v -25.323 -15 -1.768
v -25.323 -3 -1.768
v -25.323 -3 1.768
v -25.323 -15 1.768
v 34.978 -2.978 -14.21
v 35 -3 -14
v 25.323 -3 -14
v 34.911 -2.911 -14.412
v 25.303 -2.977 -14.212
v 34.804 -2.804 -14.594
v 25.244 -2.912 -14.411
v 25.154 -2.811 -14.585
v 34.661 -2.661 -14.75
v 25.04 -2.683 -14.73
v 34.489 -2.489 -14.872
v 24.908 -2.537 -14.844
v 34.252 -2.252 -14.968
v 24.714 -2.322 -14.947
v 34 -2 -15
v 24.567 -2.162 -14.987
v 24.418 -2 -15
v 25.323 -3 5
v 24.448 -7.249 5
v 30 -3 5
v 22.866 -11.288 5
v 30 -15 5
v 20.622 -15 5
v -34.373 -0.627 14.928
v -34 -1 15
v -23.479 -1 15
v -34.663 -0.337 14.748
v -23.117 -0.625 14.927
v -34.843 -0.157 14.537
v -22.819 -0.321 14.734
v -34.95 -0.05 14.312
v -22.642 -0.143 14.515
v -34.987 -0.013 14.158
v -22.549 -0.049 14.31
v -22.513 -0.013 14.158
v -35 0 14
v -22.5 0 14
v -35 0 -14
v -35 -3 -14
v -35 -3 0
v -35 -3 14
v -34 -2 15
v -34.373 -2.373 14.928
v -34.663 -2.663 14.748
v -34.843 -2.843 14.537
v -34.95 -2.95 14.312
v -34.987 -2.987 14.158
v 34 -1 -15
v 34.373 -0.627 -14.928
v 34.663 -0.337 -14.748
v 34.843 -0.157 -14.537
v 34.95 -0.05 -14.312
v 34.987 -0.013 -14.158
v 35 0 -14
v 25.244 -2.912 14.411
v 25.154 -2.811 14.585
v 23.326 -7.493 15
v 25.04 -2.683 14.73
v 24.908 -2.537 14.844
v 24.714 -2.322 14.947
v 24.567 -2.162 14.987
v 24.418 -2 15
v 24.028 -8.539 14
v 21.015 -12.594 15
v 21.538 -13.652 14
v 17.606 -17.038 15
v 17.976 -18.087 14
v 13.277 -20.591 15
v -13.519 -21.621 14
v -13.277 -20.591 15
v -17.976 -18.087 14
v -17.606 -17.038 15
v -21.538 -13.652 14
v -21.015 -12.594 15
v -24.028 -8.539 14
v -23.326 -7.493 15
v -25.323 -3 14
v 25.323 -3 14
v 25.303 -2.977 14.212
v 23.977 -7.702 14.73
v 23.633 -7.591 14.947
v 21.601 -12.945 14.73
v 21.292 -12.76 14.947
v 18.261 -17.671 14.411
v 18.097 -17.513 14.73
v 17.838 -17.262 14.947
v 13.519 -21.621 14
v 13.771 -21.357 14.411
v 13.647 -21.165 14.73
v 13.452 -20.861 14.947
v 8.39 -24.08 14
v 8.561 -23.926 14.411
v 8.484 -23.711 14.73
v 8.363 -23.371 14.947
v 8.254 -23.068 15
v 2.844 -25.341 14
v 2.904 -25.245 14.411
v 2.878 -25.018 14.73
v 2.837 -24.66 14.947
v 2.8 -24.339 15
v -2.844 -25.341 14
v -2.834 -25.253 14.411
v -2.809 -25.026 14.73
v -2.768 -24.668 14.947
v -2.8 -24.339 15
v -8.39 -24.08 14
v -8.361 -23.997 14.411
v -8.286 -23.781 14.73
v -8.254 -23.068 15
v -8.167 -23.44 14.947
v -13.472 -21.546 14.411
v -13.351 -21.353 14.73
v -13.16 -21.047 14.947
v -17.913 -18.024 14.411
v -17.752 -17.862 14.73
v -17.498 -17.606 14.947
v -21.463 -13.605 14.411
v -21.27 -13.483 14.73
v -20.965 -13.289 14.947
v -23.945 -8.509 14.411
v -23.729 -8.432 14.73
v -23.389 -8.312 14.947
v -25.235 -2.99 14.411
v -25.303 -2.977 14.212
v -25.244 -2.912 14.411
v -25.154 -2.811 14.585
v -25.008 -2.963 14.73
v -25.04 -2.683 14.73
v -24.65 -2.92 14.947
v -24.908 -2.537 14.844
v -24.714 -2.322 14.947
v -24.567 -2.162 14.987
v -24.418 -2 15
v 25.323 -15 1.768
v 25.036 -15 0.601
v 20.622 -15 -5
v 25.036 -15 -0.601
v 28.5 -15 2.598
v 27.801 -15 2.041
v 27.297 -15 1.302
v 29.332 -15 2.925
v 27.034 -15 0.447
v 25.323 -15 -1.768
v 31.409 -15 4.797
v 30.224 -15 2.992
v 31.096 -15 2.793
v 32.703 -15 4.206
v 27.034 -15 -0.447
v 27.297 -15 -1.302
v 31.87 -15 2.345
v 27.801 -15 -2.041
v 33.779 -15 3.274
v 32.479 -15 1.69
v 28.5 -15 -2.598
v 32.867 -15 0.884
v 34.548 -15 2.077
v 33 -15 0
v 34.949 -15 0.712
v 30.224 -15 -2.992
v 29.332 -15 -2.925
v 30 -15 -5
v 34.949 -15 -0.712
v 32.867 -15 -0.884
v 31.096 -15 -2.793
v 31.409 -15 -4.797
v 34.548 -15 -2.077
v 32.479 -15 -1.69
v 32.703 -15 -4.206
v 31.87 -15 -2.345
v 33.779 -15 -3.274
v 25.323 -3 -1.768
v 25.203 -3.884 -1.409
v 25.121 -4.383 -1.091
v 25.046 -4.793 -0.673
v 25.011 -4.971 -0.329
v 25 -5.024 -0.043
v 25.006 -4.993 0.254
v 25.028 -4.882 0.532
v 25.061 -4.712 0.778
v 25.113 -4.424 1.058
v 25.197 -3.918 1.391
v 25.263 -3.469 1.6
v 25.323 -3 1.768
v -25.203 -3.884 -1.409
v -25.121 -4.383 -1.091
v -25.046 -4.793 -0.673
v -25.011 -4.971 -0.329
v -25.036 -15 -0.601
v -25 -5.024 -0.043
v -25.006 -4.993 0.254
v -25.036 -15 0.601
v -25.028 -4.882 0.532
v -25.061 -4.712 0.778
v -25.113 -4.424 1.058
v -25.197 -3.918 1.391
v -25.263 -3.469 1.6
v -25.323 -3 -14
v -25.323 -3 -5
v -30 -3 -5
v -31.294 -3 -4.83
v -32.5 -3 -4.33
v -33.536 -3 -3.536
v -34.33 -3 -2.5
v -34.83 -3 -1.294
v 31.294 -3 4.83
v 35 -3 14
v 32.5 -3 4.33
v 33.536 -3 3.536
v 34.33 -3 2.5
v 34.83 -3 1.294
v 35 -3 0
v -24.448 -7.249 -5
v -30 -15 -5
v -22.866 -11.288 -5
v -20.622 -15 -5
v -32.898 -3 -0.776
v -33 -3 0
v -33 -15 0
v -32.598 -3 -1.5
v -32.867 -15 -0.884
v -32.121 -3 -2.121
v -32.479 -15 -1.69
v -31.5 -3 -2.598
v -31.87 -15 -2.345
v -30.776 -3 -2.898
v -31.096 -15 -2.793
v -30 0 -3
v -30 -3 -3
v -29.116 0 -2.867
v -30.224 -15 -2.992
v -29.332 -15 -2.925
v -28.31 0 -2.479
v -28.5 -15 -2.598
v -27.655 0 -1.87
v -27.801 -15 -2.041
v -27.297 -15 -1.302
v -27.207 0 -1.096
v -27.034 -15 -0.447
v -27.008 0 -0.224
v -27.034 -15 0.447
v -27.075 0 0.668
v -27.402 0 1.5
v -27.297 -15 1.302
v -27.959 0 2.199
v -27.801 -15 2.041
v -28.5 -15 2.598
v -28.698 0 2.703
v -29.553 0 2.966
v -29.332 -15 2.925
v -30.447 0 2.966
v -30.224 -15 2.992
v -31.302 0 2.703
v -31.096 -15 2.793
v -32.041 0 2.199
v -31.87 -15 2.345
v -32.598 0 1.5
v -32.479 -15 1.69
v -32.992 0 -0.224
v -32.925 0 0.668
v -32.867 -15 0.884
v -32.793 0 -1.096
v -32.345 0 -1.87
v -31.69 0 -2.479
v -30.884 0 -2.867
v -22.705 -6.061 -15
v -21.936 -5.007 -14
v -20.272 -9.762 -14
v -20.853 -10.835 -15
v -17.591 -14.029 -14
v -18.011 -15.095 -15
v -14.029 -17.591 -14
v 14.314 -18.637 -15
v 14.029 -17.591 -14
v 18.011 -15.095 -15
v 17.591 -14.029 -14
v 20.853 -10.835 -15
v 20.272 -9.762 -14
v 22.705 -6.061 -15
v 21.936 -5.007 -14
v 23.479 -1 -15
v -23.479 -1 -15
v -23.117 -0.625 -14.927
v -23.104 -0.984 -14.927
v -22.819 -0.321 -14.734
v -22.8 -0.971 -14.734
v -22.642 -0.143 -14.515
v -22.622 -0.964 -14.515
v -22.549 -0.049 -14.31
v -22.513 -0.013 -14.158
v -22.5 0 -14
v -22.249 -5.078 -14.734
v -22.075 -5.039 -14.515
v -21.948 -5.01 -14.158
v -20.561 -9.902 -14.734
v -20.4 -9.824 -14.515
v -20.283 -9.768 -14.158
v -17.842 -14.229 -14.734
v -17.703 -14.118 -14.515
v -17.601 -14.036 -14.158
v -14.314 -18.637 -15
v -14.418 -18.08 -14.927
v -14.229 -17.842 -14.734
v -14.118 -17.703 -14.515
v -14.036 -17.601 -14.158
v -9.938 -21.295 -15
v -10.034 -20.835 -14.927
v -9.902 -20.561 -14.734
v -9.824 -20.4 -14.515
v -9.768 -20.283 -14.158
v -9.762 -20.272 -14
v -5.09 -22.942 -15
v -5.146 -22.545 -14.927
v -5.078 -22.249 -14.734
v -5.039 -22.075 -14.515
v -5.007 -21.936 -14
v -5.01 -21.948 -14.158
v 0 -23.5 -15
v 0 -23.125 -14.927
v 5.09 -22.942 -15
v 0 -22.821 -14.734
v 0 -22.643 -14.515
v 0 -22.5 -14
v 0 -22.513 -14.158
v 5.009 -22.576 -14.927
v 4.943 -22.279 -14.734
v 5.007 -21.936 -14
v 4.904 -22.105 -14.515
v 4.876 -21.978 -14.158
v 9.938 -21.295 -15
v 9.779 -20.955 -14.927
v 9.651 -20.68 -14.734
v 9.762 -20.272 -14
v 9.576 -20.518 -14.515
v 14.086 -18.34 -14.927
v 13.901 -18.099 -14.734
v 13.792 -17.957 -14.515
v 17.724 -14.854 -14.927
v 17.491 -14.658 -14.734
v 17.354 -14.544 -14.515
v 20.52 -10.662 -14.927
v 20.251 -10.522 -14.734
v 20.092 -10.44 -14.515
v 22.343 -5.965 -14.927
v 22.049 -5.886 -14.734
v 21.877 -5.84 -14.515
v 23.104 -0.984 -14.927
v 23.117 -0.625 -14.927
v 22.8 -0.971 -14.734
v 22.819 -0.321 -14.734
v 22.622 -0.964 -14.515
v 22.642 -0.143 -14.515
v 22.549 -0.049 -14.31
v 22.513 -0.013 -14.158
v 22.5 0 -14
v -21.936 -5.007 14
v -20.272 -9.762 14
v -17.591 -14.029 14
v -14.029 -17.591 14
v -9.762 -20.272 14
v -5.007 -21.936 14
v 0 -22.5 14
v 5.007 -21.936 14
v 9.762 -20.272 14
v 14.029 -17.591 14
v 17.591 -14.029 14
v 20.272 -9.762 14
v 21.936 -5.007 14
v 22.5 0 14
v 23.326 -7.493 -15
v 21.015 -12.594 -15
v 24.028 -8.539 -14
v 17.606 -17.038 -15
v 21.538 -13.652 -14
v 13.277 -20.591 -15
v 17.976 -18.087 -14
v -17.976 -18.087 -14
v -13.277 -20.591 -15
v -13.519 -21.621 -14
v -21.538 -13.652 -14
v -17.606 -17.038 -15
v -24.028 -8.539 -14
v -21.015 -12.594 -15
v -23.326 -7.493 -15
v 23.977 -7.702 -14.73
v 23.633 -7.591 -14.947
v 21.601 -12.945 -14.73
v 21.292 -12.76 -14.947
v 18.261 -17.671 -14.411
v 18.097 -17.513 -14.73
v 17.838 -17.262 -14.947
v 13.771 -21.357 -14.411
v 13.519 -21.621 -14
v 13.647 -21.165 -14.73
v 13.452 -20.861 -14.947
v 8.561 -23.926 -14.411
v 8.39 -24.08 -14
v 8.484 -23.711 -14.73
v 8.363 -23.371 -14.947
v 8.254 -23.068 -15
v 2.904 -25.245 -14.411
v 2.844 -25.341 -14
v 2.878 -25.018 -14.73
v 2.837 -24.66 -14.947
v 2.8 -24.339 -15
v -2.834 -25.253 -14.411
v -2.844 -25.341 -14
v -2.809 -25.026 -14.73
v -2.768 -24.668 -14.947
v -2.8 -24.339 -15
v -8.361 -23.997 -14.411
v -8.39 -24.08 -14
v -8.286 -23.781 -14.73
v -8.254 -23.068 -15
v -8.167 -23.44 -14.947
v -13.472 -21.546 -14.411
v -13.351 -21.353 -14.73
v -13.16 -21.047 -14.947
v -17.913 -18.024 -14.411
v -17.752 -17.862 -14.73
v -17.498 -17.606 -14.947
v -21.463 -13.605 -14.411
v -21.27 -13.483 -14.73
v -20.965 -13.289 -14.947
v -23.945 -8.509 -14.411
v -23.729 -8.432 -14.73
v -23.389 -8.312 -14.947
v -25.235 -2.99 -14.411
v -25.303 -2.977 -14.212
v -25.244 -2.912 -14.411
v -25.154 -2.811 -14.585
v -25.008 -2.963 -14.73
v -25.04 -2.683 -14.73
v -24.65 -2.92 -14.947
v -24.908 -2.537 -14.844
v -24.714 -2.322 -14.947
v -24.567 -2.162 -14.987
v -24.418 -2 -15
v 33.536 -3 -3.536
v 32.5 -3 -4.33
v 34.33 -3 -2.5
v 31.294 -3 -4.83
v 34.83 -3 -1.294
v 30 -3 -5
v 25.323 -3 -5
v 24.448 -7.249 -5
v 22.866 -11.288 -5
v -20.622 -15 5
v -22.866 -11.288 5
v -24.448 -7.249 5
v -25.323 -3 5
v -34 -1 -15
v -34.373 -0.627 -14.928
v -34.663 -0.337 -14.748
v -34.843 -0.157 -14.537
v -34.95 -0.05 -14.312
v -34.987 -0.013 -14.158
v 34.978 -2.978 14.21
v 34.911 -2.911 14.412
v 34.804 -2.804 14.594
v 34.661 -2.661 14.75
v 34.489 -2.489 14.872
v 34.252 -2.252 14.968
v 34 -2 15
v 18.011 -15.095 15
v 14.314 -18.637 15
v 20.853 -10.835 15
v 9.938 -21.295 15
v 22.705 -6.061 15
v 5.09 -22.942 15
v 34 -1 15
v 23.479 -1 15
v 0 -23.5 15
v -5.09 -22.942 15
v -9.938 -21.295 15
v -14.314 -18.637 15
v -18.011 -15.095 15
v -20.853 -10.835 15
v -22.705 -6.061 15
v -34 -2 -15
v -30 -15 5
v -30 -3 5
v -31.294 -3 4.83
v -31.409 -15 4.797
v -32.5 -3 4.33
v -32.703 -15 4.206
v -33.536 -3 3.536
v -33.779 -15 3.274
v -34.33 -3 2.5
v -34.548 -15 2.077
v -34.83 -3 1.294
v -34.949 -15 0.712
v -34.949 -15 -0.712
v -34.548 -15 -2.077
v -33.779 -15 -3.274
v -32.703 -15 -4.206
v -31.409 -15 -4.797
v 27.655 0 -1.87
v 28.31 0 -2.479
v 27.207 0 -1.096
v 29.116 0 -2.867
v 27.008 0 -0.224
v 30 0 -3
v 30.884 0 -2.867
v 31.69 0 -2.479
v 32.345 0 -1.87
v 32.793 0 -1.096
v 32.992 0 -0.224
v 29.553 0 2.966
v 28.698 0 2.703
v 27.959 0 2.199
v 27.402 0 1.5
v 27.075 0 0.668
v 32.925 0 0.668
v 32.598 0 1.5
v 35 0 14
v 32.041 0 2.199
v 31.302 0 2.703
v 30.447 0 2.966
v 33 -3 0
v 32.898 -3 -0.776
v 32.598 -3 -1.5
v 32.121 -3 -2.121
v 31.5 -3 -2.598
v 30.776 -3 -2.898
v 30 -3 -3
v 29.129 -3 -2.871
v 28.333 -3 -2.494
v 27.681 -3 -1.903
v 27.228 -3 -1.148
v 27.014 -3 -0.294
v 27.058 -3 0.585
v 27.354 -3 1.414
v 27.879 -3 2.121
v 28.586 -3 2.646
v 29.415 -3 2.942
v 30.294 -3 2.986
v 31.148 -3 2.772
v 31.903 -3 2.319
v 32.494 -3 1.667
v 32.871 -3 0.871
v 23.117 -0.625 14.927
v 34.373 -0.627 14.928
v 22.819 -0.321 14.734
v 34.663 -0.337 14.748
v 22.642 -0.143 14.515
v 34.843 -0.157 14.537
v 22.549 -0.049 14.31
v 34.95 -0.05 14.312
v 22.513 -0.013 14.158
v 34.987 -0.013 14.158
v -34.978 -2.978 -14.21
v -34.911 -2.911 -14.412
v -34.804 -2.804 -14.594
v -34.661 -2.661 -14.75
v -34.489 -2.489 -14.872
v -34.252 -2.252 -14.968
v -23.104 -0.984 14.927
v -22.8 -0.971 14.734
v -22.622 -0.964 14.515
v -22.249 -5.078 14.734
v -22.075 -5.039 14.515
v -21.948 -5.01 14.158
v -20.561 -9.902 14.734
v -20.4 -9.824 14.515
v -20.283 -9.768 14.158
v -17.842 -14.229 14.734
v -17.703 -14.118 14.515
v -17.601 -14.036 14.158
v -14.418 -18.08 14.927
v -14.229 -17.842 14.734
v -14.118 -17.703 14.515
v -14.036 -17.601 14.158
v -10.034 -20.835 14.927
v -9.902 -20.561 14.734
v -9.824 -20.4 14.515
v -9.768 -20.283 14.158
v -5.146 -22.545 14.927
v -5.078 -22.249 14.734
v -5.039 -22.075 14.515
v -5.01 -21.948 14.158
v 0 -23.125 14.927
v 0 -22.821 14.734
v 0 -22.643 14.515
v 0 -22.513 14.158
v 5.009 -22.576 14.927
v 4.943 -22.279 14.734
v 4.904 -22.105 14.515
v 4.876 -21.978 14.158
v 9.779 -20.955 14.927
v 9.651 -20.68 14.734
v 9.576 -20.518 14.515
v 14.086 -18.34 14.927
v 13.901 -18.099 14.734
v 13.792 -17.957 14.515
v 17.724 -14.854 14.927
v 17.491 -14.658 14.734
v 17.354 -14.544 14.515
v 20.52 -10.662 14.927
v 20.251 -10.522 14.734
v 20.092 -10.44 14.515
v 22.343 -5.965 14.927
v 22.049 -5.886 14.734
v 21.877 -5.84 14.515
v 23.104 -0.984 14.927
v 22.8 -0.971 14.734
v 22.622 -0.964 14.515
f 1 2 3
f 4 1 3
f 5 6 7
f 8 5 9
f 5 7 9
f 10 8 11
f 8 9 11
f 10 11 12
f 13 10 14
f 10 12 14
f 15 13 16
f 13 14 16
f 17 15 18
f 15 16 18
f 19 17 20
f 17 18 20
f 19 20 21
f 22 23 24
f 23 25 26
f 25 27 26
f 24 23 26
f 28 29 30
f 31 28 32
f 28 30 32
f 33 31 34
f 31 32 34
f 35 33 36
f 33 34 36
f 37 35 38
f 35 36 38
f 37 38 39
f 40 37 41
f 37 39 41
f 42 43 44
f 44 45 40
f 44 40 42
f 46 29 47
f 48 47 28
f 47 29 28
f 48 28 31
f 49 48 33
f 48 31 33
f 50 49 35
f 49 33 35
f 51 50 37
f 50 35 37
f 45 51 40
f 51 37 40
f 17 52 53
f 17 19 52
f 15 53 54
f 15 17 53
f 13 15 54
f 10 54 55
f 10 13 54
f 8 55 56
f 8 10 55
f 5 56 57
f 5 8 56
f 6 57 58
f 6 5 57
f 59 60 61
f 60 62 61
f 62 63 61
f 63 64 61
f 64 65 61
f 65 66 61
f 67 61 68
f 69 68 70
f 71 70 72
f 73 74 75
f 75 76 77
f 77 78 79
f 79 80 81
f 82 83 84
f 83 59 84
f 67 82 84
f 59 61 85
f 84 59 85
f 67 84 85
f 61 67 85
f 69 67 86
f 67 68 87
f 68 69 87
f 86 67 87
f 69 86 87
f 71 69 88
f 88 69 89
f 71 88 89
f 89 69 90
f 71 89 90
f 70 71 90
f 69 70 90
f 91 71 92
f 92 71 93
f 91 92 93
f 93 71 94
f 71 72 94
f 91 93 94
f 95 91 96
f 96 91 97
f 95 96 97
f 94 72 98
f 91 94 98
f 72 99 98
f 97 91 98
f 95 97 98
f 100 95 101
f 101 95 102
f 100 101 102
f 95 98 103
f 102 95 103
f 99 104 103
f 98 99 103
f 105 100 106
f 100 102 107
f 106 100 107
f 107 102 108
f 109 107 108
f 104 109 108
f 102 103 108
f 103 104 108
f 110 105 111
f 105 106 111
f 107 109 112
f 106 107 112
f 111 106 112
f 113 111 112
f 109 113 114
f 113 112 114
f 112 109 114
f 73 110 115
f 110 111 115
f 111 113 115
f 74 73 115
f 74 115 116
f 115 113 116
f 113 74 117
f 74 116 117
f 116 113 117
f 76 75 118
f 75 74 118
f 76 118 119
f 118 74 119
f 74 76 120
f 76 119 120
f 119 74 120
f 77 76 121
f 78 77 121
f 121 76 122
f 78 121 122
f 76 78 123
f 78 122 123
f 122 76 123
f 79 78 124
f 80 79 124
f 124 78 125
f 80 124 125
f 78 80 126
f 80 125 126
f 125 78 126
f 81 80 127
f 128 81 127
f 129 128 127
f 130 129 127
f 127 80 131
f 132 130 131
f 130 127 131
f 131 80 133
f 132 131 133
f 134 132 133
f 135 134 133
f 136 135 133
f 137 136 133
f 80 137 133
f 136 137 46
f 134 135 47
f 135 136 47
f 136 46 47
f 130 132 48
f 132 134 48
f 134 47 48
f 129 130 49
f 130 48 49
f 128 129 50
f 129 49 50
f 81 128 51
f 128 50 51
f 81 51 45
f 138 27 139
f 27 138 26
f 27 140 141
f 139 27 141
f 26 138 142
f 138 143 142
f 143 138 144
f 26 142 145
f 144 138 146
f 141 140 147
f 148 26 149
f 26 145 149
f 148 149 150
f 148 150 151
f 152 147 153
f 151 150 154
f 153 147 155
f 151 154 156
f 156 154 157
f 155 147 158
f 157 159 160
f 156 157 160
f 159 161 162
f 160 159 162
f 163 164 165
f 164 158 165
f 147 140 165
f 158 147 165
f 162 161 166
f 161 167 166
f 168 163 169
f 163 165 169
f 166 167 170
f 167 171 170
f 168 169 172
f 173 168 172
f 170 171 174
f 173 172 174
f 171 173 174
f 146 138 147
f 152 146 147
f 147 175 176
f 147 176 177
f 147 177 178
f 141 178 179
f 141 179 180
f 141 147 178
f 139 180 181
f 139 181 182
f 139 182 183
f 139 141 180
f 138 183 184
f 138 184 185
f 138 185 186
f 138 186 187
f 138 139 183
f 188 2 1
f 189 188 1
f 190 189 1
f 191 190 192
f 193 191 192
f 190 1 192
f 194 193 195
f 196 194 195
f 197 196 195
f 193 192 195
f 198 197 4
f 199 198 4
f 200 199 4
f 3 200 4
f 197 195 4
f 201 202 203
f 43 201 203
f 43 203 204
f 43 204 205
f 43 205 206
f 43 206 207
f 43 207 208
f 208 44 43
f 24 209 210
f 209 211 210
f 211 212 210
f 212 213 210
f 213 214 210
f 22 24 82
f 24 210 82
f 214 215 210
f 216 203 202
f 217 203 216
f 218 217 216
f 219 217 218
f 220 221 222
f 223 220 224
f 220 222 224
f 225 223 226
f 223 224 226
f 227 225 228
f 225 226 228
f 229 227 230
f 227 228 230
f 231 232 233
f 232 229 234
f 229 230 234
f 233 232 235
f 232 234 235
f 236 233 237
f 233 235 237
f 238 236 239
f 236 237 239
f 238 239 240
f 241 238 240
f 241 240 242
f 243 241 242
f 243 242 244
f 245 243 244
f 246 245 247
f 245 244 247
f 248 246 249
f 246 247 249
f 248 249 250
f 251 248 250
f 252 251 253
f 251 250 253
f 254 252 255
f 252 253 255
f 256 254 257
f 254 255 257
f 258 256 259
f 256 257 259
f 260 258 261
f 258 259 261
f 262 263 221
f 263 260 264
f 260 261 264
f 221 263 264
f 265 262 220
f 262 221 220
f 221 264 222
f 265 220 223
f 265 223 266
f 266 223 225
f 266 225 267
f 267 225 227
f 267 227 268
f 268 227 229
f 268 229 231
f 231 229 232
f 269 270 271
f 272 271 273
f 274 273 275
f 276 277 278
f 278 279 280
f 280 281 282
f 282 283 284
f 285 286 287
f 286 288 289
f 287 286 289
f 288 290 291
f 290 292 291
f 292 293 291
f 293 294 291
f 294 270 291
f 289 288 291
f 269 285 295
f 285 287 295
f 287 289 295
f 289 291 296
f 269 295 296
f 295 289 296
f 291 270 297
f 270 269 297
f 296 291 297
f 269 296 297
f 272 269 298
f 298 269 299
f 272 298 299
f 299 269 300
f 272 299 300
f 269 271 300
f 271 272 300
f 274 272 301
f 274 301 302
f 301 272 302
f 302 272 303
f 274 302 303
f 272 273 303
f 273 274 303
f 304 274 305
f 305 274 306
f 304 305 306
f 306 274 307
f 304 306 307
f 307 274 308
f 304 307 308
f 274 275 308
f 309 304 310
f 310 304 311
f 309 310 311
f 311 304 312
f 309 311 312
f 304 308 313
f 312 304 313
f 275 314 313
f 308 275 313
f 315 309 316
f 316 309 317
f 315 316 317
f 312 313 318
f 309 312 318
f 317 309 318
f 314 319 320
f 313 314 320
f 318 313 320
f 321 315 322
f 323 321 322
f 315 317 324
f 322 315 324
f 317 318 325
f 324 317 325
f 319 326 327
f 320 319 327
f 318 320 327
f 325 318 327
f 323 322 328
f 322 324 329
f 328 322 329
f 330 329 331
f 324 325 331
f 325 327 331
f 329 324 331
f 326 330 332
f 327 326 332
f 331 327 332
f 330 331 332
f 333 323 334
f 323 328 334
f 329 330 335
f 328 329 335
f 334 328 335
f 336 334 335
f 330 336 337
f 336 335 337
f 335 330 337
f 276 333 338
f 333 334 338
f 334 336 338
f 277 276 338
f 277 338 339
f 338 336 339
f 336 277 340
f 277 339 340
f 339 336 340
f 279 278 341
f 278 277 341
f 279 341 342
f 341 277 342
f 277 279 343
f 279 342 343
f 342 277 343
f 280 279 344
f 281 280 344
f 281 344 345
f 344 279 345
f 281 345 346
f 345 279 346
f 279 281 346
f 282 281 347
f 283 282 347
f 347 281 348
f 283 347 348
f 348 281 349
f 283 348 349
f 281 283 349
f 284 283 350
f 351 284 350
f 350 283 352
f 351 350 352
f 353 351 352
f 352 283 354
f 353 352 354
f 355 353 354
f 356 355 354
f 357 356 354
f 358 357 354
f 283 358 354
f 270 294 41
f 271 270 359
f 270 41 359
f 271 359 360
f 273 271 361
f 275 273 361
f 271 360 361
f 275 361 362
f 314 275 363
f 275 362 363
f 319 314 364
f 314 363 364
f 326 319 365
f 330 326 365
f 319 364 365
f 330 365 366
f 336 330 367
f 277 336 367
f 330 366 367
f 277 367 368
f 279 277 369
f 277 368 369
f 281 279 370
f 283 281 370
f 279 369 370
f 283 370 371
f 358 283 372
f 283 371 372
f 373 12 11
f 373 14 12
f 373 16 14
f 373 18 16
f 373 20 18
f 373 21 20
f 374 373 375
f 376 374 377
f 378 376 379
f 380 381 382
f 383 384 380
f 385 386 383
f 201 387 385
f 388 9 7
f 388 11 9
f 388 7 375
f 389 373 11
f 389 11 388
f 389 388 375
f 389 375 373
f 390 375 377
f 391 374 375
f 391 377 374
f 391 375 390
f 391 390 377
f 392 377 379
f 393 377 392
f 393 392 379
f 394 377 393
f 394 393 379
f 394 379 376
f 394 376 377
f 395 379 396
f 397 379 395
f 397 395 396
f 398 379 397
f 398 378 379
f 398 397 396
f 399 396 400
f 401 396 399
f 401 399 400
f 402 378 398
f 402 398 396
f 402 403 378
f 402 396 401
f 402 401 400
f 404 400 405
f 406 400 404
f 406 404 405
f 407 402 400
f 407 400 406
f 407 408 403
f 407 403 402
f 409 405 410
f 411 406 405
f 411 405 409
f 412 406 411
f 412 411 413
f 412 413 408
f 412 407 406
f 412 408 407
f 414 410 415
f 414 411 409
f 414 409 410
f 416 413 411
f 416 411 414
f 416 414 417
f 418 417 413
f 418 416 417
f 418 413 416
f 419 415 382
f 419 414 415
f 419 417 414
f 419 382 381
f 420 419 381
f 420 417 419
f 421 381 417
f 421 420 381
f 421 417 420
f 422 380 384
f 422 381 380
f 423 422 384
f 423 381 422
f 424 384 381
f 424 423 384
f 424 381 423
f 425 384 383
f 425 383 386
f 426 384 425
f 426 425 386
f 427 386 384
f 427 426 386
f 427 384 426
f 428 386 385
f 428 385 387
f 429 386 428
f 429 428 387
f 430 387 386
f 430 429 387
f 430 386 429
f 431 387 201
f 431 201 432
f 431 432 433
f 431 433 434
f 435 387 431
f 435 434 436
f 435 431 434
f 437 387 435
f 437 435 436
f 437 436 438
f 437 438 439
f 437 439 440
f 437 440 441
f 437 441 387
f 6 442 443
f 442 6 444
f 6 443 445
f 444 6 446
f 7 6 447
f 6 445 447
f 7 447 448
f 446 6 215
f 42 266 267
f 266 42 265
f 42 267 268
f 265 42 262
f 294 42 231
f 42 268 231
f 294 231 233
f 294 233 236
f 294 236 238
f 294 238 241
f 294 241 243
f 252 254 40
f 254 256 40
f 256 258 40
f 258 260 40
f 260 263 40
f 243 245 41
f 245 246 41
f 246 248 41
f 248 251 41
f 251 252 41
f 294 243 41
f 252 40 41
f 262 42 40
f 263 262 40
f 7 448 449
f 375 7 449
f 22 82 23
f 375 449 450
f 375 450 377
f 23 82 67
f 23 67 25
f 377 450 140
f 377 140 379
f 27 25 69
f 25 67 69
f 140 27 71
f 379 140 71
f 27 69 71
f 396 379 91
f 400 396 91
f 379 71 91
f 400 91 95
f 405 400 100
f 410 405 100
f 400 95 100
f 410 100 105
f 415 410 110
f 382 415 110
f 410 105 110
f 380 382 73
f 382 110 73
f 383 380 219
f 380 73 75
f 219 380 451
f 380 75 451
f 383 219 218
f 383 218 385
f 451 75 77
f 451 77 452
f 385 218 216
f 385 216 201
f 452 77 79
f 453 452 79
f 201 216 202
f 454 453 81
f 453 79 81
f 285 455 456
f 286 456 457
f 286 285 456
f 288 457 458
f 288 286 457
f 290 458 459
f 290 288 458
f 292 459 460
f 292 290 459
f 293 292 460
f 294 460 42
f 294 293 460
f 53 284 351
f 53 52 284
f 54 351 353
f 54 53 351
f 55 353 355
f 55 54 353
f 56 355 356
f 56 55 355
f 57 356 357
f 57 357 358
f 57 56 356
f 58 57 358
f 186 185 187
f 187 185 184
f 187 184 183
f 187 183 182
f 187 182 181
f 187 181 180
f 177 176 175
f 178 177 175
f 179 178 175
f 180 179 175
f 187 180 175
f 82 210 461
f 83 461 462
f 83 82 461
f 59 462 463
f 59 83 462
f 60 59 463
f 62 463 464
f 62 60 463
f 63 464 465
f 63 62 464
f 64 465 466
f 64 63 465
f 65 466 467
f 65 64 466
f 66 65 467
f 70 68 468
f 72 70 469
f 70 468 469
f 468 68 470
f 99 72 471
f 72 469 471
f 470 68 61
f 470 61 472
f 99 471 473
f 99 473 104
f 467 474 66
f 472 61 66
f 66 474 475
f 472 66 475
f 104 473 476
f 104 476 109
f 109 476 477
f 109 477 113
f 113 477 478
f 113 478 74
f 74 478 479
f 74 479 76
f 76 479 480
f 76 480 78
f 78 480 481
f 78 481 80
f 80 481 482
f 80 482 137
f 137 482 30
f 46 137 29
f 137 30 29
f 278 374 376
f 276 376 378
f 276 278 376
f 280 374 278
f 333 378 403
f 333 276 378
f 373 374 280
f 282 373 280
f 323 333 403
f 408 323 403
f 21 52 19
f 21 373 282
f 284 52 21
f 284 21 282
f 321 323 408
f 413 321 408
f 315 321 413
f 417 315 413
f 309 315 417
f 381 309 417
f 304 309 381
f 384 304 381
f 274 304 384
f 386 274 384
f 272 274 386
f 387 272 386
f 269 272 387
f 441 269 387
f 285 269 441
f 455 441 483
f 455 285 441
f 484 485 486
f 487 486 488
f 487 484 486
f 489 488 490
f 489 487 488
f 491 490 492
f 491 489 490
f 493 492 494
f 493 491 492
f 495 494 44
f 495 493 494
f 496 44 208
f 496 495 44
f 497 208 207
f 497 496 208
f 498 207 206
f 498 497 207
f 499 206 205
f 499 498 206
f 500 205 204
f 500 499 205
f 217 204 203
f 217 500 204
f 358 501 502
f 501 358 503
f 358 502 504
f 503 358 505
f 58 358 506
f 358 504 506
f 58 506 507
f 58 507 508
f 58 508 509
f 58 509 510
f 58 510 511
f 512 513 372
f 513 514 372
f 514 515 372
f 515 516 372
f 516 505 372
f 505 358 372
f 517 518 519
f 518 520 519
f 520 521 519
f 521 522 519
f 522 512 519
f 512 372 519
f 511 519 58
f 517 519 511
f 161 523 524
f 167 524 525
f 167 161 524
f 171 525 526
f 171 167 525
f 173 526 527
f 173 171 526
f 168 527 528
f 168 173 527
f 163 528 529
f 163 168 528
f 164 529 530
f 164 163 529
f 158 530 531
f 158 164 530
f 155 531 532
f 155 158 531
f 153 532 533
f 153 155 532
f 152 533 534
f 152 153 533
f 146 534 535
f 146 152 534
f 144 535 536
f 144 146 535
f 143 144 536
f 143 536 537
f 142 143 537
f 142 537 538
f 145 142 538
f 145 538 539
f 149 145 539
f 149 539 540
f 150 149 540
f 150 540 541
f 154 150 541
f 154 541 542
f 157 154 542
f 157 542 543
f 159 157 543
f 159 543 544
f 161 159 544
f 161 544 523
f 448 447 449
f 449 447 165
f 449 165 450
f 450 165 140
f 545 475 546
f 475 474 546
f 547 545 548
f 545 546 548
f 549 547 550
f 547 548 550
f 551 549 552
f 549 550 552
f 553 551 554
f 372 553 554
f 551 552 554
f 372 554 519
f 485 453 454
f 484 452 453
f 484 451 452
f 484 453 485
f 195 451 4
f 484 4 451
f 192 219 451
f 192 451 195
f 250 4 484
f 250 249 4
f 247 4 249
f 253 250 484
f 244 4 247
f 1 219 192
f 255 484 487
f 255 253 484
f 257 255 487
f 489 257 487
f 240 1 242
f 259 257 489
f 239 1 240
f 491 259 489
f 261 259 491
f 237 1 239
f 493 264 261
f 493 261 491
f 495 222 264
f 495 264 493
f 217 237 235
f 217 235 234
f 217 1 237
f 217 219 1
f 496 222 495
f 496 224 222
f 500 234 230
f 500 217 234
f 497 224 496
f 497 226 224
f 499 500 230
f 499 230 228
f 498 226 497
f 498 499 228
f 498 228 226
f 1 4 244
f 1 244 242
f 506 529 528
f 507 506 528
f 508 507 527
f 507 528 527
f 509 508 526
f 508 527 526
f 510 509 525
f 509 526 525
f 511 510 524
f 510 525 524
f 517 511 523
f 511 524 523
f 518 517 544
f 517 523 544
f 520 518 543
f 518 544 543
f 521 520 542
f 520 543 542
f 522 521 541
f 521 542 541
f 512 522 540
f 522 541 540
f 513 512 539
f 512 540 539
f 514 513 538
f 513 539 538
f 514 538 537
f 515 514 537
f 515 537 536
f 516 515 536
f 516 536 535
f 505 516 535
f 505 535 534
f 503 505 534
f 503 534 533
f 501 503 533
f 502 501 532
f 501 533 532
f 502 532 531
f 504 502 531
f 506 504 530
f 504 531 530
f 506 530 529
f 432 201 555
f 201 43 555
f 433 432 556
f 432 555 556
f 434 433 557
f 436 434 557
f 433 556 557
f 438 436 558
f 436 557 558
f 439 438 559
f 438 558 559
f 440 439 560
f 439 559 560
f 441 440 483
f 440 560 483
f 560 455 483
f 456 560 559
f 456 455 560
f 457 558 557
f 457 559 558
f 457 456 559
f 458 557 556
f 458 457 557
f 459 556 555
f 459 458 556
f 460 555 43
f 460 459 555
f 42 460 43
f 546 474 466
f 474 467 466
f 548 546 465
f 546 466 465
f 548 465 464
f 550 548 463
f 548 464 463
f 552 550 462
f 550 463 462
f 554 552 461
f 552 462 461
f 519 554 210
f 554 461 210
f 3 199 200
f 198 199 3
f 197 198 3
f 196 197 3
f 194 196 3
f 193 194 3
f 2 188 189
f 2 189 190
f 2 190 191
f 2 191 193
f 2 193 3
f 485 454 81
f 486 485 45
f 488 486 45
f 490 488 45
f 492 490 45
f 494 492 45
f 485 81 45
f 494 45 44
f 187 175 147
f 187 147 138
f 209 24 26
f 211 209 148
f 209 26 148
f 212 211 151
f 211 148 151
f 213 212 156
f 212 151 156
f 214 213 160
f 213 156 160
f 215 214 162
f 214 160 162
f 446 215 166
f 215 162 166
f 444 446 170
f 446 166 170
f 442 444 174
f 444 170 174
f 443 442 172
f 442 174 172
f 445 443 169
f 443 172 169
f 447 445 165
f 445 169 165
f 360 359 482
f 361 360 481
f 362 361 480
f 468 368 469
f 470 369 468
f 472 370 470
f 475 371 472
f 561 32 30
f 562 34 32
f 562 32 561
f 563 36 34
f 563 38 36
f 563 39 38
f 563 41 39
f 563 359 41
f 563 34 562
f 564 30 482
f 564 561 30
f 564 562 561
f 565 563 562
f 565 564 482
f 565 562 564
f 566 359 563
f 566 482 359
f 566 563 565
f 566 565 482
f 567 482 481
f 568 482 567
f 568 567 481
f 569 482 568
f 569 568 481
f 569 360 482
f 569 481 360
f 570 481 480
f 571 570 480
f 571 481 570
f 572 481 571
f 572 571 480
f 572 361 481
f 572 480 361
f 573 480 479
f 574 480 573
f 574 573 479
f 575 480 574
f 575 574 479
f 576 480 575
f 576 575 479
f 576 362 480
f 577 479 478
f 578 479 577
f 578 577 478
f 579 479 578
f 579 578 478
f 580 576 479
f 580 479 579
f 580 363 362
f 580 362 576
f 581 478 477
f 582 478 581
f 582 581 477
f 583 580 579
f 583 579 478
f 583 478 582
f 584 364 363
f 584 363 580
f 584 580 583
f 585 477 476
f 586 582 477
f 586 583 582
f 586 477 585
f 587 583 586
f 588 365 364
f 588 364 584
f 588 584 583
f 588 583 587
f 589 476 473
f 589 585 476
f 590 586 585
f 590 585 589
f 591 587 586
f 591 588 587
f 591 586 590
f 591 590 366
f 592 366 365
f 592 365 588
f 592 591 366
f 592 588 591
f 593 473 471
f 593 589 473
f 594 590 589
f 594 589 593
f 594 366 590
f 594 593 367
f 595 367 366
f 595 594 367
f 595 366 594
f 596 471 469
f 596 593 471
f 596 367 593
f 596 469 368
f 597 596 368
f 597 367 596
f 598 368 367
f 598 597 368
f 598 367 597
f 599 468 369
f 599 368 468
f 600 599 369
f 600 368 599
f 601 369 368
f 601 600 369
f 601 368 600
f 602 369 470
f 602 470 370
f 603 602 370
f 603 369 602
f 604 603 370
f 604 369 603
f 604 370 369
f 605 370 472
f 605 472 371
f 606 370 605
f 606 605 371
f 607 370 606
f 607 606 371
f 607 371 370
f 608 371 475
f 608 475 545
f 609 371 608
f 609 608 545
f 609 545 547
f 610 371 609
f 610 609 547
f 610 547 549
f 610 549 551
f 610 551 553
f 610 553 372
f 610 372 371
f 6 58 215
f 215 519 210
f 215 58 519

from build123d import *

# Parameters (mm, degrees)
BOSS_EXTRUDE1_DEPTH = 15
BOSS_EXTRUDE2_REACH = 58.23
BOSS_EXTRUDE2_START = 12
SKETCH4_R           = 3
FILLET1_R           = 1
SKETCH4_4_R         = 3
CUT_EXTRUDE1_DEPTH  = 45.229515196
SKETCH5_R           = 3
CUT_EXTRUDE2_DEPTH  = 41.926764018


with BuildPart() as part:
    # Sketch2 → Boss-Extrude1 (new, symmetric)
    with BuildSketch(Plane.XY):
        with BuildLine():
            Line((-35, 0), (-22.5, 0))
            ThreePointArc((-22.5, 0), (0, -22.5), (22.5, 0))
            Line((22.5, 0), (35, 0))
            Line((35, 0), (35, -3))
            Line((35, -3), (25.322914524, -3))
            ThreePointArc((25.322914524, -3), (0, -25.5), (-25.322914524, -3))
            Line((-25.322914524, -3), (-35, -3))
            Line((-35, -3), (-35, 0))
        make_face()
    extrude(amount=BOSS_EXTRUDE1_DEPTH, both=True)

    # Sketch4 → Boss-Extrude2 (add, up to next)
    with BuildSketch(Plane.XZ.offset(3).offset(BOSS_EXTRUDE2_START), mode=Mode.PRIVATE) as boss_extrude2_sk1:
        with BuildLine():
            Line((18, 5), (18, -5))
            Line((18, -5), (30, -5))
            ThreePointArc((30, -5), (35, 0), (30, 5))
            Line((30, 5), (18, 5))
        make_face()
        with BuildLine():
            ThreePointArc((25.322914524, -1.767730594), (25, 0), (25.322914524, 1.767730594))
            Line((25.322914524, 1.767730594), (25.322914524, -1.767730594))
        make_face(mode=Mode.SUBTRACT)
        with Locations((30, 0)):
            Circle(SKETCH4_R, mode=Mode.SUBTRACT)
    boss_extrude2_tool1 = extrude(boss_extrude2_sk1.sketch, amount=-BOSS_EXTRUDE2_REACH, mode=Mode.PRIVATE) - part.part
    boss_extrude2 = boss_extrude2_tool1.solids().sort_by_distance((24, -15, 4.802769))[0]
    add(boss_extrude2)

    # Fillet1
    fillet1_edges = [part.edges().sort_by_distance(p)[0] for p in [
        (-30.161457262, -3, -15),
        (0, -25.5, -15),
        (30.161457262, -3, -15),
        (35, -1.5, -15),
        (28.75, 0, -15),
        (0, -22.5, -15),
        (-28.75, 0, -15),
        (-35, -1.5, -15),
        (-28.75, 0, 15),
        (0, -22.5, 15),
        (28.75, 0, 15),
        (35, -1.5, 15),
        (30.161457262, -3, 15),
        (0, -25.5, 15),
        (-30.161457262, -3, 15),
        (-35, -1.5, 15),
    ]]
    fillet(fillet1_edges, radius=FILLET1_R)

    # Sketch4<4> → Cut-Extrude1 (cut, through all)
    with BuildSketch(Plane.XZ.offset(3)):
        with Locations((30, 0)):
            Circle(SKETCH4_4_R)
    extrude(amount=-CUT_EXTRUDE1_DEPTH, mode=Mode.SUBTRACT)

    # Mirror1: Boss-Extrude2 across plane
    add(boss_extrude2.mirror(Plane(origin=(0, 0, 0), x_dir=(0, 0, 1), z_dir=(1, 0, 0))))

    # Sketch5 → Cut-Extrude2 (cut, through all)
    with BuildSketch(Plane.XZ.offset(15)):
        with Locations((-30, 0)):
            Circle(SKETCH5_R)
    extrude(amount=-CUT_EXTRUDE2_DEPTH, mode=Mode.SUBTRACT)


solid = part.part
